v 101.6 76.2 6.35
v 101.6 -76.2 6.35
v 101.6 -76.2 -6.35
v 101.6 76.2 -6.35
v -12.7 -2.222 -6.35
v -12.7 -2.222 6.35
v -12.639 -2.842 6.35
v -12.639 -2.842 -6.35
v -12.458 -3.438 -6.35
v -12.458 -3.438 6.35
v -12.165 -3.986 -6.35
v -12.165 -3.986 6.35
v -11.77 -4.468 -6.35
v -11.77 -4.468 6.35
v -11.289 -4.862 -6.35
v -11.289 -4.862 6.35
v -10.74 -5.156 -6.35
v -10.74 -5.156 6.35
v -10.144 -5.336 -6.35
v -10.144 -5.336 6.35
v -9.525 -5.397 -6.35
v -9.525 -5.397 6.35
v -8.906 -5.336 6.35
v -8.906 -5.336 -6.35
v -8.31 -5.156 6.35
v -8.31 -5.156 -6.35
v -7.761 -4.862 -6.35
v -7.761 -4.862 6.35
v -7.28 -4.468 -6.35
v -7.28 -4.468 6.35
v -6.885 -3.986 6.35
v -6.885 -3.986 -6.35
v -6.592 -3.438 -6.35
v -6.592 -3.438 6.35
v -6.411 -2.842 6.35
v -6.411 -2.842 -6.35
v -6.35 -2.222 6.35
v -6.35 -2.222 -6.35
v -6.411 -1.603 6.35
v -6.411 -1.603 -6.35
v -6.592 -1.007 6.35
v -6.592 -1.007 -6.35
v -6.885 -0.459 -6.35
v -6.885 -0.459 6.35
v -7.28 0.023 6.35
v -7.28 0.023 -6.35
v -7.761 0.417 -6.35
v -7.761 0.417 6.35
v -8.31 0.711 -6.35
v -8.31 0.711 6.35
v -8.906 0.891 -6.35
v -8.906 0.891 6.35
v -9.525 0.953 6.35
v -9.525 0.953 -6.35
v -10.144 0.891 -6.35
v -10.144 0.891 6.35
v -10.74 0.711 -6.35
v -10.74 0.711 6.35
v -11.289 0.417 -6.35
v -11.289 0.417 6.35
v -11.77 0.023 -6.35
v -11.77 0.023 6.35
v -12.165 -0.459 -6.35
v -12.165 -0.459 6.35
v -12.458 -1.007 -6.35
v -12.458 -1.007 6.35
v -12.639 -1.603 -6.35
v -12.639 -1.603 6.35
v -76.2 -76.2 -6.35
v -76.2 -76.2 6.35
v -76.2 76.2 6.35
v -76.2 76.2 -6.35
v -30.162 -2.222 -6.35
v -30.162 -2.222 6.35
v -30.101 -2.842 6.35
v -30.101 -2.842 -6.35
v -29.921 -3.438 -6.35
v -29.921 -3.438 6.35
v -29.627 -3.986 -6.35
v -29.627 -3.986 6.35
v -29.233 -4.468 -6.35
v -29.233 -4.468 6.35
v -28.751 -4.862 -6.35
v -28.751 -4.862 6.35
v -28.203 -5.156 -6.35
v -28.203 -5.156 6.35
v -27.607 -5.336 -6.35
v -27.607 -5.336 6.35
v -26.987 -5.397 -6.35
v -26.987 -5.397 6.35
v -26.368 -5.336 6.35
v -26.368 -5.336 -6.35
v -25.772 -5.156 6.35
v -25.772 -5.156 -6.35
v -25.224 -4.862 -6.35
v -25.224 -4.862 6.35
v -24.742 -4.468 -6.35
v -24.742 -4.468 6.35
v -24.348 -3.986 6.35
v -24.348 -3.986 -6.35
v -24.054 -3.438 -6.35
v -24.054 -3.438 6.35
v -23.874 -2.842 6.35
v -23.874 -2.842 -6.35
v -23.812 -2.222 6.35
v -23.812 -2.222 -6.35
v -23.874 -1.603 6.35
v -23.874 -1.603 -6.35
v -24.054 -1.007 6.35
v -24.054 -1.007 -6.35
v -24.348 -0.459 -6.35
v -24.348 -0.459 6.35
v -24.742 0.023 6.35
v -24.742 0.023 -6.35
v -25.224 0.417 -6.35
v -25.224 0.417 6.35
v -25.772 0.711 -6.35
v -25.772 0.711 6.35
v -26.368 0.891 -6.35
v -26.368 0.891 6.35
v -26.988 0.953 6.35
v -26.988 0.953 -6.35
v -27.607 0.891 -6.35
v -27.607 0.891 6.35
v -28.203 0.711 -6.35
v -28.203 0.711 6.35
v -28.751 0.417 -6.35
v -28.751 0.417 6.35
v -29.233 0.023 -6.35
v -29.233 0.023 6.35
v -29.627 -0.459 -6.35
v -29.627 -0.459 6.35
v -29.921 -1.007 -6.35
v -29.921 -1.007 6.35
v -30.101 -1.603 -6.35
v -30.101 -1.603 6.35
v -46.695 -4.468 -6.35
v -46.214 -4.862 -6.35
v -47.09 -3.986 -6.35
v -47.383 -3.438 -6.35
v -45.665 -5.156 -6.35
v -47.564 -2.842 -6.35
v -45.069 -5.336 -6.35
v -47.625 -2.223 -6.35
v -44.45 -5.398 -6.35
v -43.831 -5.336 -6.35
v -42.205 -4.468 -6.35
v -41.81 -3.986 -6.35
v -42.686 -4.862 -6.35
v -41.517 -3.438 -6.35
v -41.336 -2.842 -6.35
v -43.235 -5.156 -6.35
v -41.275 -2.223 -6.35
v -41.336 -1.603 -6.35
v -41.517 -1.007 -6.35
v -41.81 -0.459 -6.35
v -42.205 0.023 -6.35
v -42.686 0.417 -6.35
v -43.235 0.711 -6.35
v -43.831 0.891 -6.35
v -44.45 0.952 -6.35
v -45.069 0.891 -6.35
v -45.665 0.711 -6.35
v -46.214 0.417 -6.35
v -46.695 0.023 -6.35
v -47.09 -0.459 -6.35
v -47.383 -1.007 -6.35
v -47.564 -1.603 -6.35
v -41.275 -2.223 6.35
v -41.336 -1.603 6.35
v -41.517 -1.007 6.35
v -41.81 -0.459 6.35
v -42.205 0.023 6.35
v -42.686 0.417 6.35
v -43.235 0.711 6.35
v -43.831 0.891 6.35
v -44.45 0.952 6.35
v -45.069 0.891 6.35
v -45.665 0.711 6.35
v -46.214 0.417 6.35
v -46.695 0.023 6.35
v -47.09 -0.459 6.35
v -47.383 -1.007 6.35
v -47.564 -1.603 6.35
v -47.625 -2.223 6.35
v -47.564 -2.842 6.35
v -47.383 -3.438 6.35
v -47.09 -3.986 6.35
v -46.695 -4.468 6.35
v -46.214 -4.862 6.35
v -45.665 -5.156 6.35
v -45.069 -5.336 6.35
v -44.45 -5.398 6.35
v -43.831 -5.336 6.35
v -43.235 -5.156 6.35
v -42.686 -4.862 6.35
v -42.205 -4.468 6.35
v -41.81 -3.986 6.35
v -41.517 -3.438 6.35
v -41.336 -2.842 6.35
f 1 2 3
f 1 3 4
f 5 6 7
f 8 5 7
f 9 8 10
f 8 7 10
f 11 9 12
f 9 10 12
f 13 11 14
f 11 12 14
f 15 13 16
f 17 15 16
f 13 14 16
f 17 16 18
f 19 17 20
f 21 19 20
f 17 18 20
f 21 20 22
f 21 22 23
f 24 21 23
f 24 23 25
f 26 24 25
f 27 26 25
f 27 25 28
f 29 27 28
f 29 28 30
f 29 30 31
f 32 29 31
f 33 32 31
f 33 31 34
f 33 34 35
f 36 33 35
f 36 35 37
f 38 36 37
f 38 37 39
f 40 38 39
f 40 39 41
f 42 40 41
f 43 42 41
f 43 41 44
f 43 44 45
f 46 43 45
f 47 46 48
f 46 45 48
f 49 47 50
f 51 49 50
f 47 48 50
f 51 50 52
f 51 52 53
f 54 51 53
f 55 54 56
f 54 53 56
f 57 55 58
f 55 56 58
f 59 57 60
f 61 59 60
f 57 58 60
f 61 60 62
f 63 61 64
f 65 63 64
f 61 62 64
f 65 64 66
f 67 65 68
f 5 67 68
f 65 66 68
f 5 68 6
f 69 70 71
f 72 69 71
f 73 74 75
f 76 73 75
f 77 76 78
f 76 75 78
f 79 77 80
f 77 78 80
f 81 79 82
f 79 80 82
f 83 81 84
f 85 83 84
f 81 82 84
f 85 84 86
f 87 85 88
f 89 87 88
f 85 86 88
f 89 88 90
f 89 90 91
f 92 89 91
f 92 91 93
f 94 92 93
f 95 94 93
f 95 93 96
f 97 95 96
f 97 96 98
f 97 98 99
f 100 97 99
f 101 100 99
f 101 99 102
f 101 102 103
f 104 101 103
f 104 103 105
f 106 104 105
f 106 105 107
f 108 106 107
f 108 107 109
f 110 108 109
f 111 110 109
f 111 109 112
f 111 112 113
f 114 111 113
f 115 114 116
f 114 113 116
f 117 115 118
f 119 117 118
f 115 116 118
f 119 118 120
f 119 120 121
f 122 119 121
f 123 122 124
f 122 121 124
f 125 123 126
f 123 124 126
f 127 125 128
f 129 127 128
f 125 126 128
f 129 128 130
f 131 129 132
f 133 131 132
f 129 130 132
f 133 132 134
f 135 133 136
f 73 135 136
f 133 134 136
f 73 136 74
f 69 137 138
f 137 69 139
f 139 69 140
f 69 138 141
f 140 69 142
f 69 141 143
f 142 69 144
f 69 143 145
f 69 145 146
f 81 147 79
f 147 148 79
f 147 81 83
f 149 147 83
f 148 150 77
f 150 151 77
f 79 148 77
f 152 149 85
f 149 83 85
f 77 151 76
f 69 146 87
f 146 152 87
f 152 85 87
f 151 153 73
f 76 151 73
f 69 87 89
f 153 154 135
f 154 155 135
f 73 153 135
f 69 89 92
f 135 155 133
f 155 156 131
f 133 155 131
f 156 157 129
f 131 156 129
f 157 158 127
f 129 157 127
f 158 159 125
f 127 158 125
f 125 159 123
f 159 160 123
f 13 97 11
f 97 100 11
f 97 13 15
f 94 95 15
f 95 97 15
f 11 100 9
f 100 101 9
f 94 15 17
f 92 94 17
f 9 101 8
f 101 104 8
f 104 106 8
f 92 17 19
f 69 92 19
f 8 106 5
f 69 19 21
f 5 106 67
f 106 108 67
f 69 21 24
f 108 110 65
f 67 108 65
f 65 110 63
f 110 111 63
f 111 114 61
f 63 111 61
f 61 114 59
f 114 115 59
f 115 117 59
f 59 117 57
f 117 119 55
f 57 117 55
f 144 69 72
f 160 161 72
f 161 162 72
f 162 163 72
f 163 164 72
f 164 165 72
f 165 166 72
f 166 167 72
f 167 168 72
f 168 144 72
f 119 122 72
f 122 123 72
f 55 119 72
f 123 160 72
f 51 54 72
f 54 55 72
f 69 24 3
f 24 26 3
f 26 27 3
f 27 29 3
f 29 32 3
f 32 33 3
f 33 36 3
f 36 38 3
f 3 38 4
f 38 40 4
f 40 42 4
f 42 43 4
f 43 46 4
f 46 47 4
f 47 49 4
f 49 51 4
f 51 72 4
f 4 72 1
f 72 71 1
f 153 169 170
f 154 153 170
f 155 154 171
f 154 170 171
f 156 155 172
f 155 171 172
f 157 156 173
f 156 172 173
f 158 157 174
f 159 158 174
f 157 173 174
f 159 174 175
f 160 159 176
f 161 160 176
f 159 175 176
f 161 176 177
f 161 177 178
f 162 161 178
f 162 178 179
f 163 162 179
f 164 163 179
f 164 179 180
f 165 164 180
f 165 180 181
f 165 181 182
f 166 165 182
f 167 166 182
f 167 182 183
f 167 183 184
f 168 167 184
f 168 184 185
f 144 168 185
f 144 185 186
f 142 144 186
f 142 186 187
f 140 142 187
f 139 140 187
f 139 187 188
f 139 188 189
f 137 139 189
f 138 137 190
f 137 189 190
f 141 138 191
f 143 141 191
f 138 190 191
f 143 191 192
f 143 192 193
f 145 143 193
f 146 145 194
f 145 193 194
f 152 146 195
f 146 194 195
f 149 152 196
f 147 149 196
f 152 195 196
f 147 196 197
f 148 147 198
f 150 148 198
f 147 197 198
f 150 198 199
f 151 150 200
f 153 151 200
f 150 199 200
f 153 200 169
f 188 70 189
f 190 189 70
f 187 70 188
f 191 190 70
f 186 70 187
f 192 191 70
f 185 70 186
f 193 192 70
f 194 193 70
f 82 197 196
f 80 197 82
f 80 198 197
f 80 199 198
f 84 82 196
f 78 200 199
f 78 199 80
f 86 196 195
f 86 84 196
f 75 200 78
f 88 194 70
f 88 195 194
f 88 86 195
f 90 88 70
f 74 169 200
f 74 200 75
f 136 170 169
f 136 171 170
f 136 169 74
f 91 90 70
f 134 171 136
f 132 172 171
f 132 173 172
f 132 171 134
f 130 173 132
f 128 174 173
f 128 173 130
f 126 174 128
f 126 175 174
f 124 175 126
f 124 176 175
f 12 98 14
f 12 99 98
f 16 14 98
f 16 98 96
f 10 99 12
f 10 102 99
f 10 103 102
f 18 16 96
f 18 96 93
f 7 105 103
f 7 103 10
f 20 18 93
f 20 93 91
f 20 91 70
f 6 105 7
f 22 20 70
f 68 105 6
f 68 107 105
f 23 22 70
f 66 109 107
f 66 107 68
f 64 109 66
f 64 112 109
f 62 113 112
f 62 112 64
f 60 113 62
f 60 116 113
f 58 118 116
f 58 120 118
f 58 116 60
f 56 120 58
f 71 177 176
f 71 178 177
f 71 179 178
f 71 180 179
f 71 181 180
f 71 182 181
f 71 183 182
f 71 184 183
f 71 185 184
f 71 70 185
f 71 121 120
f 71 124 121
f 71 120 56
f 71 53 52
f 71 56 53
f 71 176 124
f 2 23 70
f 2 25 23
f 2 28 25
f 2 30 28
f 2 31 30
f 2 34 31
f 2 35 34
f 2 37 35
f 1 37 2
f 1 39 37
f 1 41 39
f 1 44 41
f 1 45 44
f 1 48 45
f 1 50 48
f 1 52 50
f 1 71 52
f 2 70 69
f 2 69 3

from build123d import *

# Parameters (mm, degrees)
F0_W          = 177.8
F0_H          = 152.4
F1_DEPTH      = 6.35
F1_DEPTH_BACK = 6.35
F3_DEPTH      = 12.701


with BuildPart() as f1:
    # F0 (on Top) → F1 (new body, two sides)
    with BuildSketch(Plane.XY) as f1_sk:
        with Locations((12.7, 0)):
            Rectangle(F0_W, F0_H)
    extrude(amount=F1_DEPTH)
    extrude(f1_sk.sketch, amount=-F1_DEPTH_BACK)

    # F2 (on face) → F3 (cut, through all)
    with BuildSketch(Plane.XY.offset(6.35)):
        with BuildLine():
            ThreePointArc((-47.625, -2.2225), (-44.45, -5.3975), (-41.275, -2.2225))
            ThreePointArc((-41.275, -2.2225), (-44.45, 0.9525), (-47.625, -2.2225))
        make_face()
        with BuildLine():
            ThreePointArc((-6.35, -2.2225), (-9.525, 0.9525), (-12.7, -2.2225))
            ThreePointArc((-12.7, -2.2225), (-9.525, -5.3975), (-6.35, -2.2225))
        make_face()
        with BuildLine():
            ThreePointArc((-23.8125, -2.2225), (-26.9875, 0.9525), (-30.1625, -2.2225))
            ThreePointArc((-30.1625, -2.2225), (-26.9875, -5.3975), (-23.8125, -2.2225))
        make_face()
    extrude(amount=-F3_DEPTH, mode=Mode.SUBTRACT)


solid = f1.part
